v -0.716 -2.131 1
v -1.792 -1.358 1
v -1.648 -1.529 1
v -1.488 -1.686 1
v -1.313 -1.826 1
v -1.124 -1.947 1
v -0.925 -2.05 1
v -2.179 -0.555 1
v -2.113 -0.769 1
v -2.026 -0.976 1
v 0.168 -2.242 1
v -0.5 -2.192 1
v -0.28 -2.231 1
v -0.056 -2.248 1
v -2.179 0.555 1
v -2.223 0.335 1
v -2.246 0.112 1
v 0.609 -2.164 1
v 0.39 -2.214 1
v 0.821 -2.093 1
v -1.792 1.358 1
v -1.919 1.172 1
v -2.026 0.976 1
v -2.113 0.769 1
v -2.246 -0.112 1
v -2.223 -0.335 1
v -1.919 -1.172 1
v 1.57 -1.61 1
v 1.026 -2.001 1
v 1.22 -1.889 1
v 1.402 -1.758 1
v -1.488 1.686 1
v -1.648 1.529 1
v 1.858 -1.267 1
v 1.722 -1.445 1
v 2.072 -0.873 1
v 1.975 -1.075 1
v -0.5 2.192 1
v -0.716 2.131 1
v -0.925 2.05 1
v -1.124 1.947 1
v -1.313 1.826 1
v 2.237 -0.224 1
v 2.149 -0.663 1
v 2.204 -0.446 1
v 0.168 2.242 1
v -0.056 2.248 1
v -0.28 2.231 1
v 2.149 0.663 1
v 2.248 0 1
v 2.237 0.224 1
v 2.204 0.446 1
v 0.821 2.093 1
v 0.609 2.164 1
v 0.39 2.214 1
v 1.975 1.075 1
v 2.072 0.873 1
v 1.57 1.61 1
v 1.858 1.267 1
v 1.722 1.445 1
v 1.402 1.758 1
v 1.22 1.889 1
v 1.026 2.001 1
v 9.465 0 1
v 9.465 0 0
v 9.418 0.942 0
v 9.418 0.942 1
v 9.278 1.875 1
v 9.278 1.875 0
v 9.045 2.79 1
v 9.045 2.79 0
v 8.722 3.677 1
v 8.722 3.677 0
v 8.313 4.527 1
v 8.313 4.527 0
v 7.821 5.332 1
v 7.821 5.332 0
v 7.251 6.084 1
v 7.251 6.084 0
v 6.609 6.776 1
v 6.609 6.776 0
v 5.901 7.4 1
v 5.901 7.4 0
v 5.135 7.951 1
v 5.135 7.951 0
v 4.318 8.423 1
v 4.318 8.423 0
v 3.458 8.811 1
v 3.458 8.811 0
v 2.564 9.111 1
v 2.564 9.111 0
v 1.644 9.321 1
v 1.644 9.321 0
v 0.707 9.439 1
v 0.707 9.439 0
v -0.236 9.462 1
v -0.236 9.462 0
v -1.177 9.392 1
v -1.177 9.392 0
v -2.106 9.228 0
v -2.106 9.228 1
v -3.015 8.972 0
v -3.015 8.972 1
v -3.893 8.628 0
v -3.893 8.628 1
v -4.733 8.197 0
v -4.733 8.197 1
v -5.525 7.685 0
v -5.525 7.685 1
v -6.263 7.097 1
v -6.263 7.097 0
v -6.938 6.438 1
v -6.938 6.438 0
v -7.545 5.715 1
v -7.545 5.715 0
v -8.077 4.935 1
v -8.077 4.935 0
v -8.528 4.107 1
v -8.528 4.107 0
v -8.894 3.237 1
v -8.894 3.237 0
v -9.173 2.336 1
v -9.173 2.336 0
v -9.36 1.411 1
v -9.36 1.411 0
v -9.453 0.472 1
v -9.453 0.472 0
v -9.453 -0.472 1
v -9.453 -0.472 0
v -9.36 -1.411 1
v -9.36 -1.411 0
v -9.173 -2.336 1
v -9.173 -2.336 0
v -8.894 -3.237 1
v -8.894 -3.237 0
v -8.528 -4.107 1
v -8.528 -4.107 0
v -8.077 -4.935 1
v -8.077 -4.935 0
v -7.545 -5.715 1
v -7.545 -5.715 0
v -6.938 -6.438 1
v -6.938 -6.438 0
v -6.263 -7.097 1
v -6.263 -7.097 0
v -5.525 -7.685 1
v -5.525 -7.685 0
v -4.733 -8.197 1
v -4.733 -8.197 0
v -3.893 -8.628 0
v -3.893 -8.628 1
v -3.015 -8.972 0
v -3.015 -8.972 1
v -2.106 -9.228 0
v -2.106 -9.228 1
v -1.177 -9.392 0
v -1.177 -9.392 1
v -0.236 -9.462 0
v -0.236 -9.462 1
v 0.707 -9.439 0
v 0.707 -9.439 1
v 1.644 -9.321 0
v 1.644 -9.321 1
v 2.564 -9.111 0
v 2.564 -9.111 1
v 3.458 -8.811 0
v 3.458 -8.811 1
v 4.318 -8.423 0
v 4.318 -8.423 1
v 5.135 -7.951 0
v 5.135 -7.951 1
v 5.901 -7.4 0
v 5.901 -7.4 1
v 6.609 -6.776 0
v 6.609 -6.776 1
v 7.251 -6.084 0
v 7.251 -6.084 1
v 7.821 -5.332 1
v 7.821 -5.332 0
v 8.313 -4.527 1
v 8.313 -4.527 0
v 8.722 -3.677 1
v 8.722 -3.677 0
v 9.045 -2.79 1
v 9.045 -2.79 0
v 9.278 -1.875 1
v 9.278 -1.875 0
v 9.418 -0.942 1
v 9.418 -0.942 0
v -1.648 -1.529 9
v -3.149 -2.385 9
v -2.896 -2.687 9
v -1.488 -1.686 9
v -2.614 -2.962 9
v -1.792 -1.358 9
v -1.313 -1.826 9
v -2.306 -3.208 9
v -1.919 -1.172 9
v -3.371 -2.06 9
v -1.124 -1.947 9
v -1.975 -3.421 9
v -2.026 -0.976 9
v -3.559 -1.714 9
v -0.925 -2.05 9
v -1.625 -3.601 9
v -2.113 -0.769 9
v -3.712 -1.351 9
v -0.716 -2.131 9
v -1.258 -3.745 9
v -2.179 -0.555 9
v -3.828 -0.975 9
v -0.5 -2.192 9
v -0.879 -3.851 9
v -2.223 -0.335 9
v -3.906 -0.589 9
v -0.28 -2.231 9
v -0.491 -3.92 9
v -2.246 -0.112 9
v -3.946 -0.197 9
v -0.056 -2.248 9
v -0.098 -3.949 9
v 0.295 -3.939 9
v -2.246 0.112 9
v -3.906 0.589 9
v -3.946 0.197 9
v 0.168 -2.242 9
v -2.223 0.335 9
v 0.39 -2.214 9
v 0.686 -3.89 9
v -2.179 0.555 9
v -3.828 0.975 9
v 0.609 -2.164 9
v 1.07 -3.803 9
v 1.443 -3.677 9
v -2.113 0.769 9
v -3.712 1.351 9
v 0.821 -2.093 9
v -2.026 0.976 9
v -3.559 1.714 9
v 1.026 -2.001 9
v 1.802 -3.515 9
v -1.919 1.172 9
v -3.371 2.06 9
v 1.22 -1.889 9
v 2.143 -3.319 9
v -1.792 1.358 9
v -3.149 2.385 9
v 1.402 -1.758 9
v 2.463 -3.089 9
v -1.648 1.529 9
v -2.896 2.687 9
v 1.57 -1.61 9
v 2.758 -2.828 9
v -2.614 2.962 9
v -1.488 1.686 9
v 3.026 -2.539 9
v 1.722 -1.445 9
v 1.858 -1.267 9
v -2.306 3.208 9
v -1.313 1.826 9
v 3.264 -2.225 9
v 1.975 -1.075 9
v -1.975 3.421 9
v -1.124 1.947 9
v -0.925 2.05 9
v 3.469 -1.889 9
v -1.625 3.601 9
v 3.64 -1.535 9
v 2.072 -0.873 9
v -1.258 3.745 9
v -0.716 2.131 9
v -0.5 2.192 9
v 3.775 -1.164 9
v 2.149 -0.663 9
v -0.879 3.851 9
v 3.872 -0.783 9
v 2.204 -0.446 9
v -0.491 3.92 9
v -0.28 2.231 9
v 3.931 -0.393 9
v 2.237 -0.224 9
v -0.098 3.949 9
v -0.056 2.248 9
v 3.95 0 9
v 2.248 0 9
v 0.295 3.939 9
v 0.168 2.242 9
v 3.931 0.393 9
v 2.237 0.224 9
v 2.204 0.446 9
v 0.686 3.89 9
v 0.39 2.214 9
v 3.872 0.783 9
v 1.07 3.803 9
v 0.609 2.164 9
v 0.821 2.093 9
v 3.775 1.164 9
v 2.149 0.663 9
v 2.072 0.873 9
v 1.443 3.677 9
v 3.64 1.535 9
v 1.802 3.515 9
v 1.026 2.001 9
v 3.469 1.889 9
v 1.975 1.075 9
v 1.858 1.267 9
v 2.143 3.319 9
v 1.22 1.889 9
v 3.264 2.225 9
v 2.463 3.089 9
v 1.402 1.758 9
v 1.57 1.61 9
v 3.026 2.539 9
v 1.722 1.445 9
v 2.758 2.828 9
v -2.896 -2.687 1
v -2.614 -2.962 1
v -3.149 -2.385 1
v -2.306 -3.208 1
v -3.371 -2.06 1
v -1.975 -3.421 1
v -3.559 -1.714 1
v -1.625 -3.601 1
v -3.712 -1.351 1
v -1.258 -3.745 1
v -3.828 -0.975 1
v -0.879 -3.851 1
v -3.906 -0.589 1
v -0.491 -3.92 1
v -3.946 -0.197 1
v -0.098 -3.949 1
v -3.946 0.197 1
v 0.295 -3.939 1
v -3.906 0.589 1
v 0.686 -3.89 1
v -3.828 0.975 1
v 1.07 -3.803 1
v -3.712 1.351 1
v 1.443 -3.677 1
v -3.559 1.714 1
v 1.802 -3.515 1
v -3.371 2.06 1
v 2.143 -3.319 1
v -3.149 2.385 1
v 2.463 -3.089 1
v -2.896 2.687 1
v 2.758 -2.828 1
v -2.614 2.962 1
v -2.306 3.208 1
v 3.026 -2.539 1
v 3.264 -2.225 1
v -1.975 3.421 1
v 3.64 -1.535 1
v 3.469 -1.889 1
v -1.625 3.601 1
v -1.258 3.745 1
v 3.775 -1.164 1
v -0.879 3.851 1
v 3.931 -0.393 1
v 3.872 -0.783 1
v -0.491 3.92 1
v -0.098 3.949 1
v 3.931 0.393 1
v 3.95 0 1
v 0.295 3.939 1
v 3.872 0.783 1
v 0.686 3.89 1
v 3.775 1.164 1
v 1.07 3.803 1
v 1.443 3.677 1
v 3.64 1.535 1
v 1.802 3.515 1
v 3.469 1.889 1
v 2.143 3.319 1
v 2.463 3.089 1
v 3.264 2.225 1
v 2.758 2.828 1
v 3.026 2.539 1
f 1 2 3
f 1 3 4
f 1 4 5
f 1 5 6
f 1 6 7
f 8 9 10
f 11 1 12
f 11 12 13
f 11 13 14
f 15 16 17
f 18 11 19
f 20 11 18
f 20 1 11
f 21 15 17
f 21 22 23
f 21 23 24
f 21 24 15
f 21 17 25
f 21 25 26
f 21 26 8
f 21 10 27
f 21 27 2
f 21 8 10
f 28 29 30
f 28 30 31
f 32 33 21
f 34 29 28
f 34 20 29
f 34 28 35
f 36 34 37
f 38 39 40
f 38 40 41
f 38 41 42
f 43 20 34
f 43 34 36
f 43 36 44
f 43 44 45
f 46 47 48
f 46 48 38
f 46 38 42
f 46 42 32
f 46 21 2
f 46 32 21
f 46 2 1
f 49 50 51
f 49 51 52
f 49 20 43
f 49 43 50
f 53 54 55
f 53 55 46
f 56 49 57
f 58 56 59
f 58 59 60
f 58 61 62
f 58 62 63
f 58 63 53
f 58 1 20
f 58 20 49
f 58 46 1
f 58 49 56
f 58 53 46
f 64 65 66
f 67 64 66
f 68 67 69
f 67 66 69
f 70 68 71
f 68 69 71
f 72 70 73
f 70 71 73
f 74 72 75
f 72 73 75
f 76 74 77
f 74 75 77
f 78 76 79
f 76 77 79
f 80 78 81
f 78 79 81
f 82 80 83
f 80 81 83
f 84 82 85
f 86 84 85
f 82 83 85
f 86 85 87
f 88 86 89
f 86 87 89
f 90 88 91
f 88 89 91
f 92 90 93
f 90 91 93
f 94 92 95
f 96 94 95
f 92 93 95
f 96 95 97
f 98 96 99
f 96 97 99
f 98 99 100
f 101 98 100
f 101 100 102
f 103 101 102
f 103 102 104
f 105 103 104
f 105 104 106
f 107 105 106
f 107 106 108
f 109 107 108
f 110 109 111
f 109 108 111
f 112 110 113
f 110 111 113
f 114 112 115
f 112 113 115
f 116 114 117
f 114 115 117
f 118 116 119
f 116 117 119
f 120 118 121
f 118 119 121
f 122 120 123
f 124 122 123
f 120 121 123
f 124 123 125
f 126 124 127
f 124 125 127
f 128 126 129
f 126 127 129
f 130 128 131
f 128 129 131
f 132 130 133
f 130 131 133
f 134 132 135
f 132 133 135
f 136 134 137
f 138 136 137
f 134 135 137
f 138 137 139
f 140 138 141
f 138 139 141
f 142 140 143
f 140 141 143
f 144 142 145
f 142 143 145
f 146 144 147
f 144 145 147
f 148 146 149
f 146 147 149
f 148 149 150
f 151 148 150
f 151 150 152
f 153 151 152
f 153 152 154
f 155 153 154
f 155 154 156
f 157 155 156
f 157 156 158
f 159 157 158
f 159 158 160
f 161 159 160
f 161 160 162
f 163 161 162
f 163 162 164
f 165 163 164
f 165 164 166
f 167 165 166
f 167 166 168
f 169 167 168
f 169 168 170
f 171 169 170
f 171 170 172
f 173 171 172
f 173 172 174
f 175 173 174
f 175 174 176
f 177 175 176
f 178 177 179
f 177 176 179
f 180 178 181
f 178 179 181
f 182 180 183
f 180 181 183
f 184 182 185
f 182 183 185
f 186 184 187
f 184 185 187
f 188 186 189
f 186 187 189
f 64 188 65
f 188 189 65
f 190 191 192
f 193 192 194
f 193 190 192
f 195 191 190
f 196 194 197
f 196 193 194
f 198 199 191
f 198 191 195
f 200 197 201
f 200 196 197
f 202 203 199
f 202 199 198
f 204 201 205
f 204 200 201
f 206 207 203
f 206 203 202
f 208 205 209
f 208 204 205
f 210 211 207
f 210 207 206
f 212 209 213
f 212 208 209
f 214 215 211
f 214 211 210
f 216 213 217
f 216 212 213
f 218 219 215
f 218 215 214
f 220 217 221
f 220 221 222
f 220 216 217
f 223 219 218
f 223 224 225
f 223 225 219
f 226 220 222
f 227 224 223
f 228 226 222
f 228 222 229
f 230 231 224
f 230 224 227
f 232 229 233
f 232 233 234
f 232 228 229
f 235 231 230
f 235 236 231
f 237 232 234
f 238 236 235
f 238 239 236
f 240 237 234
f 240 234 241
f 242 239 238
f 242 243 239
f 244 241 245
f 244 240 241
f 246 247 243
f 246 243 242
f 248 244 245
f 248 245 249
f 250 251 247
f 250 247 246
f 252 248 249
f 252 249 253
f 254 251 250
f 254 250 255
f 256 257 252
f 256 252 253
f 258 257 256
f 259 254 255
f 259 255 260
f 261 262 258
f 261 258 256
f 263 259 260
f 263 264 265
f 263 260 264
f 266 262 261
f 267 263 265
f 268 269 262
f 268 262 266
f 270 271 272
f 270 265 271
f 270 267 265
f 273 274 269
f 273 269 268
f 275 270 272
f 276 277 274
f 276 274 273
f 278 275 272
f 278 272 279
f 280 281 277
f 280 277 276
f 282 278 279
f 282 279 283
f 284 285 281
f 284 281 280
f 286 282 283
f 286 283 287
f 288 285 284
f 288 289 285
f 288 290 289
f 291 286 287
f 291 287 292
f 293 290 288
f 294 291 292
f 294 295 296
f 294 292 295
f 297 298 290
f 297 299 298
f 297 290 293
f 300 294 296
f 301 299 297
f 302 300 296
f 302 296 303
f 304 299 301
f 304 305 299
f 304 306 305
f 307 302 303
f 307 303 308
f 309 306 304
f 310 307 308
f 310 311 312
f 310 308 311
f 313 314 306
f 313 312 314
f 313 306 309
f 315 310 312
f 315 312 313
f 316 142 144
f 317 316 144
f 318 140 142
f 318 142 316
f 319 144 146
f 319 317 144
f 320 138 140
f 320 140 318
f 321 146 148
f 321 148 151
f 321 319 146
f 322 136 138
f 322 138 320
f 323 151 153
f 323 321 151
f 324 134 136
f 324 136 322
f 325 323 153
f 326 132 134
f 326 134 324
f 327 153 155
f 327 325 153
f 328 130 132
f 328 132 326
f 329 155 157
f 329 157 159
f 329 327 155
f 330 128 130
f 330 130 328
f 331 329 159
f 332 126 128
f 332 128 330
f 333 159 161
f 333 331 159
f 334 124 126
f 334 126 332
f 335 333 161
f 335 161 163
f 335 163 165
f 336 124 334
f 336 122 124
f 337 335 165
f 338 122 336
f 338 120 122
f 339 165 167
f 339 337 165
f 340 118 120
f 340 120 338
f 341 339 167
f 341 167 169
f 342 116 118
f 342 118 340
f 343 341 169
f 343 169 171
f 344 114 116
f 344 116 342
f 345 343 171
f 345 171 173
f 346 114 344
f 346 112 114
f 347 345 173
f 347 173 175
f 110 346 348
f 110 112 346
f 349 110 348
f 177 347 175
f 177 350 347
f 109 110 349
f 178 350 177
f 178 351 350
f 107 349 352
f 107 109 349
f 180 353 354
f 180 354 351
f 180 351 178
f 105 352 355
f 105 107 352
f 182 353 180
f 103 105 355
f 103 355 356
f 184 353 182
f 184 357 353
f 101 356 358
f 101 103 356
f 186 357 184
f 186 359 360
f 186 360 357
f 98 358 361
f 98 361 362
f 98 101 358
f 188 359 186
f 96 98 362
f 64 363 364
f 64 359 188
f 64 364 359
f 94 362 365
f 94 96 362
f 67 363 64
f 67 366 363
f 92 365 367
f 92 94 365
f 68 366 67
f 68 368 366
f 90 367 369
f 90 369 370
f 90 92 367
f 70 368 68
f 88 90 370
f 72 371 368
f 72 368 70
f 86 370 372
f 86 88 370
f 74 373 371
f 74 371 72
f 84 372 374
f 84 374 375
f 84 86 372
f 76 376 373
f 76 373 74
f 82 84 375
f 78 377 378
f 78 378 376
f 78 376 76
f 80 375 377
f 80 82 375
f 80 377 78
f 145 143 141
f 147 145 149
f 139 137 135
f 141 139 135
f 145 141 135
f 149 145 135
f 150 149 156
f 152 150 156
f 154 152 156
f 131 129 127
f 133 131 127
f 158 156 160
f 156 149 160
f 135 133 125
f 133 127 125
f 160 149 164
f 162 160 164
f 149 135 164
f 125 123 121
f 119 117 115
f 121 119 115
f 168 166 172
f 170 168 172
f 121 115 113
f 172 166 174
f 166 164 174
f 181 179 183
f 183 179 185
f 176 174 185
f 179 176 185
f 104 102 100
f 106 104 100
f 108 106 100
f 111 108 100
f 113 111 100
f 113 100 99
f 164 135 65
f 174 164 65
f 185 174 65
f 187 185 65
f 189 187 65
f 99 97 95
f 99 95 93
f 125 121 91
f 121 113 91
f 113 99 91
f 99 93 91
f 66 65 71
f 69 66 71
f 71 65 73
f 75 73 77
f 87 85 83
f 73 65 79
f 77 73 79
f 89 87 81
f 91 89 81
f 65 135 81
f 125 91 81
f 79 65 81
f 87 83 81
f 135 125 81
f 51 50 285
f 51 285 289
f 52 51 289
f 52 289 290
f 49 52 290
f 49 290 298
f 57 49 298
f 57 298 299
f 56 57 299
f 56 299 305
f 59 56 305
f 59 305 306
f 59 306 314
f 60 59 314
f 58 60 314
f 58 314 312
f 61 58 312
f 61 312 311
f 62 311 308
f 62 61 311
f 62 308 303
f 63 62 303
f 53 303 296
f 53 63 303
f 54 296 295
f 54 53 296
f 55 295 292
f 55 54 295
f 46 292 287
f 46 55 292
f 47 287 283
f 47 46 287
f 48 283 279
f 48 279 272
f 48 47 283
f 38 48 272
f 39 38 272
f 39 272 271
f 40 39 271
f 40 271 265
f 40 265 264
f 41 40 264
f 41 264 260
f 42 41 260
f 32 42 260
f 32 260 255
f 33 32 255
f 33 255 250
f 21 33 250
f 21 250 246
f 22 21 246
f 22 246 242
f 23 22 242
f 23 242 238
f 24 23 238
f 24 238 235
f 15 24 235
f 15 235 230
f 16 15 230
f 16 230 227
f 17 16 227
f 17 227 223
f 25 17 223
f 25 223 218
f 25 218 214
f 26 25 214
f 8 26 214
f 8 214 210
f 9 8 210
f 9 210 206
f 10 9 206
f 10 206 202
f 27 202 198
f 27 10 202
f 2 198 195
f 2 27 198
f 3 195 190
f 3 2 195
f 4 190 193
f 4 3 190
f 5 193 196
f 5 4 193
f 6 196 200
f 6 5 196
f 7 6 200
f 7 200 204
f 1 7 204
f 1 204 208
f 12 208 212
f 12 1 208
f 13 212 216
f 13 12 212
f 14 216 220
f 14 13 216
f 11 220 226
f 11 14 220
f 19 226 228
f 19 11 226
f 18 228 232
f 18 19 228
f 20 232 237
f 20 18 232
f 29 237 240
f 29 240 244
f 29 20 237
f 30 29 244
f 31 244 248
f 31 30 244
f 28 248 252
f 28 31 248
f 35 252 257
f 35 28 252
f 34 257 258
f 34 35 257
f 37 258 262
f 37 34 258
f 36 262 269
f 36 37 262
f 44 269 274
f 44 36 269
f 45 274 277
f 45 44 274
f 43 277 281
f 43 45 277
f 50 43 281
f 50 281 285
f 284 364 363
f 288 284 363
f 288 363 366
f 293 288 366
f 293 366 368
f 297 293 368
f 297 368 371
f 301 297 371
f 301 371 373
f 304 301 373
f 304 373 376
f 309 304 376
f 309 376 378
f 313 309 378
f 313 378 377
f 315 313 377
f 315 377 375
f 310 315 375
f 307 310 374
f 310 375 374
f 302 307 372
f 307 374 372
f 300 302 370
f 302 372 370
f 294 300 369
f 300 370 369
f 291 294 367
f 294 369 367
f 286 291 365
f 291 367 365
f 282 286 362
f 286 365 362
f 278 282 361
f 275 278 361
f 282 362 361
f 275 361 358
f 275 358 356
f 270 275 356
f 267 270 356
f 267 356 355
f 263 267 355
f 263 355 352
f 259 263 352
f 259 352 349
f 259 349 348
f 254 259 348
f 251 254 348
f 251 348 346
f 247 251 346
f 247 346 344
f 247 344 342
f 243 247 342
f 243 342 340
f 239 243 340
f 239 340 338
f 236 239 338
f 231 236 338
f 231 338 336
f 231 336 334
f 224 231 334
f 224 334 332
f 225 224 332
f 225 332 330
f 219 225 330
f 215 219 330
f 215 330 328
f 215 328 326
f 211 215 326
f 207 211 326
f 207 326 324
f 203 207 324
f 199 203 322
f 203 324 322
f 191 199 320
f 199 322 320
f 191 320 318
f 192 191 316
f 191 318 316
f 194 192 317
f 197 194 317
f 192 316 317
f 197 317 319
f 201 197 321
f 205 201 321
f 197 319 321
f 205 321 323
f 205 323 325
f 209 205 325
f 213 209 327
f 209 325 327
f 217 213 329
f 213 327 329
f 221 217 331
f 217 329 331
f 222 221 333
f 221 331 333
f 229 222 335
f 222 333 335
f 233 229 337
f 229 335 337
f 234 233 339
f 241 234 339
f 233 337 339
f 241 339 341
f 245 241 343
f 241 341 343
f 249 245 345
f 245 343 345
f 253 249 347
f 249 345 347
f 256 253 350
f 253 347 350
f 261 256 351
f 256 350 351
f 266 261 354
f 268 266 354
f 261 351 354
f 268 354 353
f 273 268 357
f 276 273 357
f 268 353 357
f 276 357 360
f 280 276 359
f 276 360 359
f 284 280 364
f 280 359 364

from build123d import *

# Parameters (mm, degrees)
F0_R     = 9.46522
F3_DEPTH = 1
F1_R     = 3.950475
F4_DEPTH = 9
F2_R     = 2.248498
F6_DEPTH = 9
F5_R     = 2.248498
F7_DEPTH = 1


with BuildPart() as f3:
    # F0 (on Top) → F3 (new body)
    with BuildSketch(Plane.XY):
        Circle(F0_R)
    extrude(amount=F3_DEPTH)

    # F1 (on Top) → F4 (join)
    with BuildSketch(Plane.XY):
        Circle(F1_R)
    extrude(amount=F4_DEPTH)

    # F2 (on Top) → F6 (cut)
    with BuildSketch(Plane.XY):
        Circle(F2_R)
    extrude(amount=F6_DEPTH, mode=Mode.SUBTRACT)

    # F5 (on Top) → F7 (join)
    with BuildSketch(Plane.XY):
        Circle(F5_R)
    extrude(amount=F7_DEPTH)


solid = f3.part
